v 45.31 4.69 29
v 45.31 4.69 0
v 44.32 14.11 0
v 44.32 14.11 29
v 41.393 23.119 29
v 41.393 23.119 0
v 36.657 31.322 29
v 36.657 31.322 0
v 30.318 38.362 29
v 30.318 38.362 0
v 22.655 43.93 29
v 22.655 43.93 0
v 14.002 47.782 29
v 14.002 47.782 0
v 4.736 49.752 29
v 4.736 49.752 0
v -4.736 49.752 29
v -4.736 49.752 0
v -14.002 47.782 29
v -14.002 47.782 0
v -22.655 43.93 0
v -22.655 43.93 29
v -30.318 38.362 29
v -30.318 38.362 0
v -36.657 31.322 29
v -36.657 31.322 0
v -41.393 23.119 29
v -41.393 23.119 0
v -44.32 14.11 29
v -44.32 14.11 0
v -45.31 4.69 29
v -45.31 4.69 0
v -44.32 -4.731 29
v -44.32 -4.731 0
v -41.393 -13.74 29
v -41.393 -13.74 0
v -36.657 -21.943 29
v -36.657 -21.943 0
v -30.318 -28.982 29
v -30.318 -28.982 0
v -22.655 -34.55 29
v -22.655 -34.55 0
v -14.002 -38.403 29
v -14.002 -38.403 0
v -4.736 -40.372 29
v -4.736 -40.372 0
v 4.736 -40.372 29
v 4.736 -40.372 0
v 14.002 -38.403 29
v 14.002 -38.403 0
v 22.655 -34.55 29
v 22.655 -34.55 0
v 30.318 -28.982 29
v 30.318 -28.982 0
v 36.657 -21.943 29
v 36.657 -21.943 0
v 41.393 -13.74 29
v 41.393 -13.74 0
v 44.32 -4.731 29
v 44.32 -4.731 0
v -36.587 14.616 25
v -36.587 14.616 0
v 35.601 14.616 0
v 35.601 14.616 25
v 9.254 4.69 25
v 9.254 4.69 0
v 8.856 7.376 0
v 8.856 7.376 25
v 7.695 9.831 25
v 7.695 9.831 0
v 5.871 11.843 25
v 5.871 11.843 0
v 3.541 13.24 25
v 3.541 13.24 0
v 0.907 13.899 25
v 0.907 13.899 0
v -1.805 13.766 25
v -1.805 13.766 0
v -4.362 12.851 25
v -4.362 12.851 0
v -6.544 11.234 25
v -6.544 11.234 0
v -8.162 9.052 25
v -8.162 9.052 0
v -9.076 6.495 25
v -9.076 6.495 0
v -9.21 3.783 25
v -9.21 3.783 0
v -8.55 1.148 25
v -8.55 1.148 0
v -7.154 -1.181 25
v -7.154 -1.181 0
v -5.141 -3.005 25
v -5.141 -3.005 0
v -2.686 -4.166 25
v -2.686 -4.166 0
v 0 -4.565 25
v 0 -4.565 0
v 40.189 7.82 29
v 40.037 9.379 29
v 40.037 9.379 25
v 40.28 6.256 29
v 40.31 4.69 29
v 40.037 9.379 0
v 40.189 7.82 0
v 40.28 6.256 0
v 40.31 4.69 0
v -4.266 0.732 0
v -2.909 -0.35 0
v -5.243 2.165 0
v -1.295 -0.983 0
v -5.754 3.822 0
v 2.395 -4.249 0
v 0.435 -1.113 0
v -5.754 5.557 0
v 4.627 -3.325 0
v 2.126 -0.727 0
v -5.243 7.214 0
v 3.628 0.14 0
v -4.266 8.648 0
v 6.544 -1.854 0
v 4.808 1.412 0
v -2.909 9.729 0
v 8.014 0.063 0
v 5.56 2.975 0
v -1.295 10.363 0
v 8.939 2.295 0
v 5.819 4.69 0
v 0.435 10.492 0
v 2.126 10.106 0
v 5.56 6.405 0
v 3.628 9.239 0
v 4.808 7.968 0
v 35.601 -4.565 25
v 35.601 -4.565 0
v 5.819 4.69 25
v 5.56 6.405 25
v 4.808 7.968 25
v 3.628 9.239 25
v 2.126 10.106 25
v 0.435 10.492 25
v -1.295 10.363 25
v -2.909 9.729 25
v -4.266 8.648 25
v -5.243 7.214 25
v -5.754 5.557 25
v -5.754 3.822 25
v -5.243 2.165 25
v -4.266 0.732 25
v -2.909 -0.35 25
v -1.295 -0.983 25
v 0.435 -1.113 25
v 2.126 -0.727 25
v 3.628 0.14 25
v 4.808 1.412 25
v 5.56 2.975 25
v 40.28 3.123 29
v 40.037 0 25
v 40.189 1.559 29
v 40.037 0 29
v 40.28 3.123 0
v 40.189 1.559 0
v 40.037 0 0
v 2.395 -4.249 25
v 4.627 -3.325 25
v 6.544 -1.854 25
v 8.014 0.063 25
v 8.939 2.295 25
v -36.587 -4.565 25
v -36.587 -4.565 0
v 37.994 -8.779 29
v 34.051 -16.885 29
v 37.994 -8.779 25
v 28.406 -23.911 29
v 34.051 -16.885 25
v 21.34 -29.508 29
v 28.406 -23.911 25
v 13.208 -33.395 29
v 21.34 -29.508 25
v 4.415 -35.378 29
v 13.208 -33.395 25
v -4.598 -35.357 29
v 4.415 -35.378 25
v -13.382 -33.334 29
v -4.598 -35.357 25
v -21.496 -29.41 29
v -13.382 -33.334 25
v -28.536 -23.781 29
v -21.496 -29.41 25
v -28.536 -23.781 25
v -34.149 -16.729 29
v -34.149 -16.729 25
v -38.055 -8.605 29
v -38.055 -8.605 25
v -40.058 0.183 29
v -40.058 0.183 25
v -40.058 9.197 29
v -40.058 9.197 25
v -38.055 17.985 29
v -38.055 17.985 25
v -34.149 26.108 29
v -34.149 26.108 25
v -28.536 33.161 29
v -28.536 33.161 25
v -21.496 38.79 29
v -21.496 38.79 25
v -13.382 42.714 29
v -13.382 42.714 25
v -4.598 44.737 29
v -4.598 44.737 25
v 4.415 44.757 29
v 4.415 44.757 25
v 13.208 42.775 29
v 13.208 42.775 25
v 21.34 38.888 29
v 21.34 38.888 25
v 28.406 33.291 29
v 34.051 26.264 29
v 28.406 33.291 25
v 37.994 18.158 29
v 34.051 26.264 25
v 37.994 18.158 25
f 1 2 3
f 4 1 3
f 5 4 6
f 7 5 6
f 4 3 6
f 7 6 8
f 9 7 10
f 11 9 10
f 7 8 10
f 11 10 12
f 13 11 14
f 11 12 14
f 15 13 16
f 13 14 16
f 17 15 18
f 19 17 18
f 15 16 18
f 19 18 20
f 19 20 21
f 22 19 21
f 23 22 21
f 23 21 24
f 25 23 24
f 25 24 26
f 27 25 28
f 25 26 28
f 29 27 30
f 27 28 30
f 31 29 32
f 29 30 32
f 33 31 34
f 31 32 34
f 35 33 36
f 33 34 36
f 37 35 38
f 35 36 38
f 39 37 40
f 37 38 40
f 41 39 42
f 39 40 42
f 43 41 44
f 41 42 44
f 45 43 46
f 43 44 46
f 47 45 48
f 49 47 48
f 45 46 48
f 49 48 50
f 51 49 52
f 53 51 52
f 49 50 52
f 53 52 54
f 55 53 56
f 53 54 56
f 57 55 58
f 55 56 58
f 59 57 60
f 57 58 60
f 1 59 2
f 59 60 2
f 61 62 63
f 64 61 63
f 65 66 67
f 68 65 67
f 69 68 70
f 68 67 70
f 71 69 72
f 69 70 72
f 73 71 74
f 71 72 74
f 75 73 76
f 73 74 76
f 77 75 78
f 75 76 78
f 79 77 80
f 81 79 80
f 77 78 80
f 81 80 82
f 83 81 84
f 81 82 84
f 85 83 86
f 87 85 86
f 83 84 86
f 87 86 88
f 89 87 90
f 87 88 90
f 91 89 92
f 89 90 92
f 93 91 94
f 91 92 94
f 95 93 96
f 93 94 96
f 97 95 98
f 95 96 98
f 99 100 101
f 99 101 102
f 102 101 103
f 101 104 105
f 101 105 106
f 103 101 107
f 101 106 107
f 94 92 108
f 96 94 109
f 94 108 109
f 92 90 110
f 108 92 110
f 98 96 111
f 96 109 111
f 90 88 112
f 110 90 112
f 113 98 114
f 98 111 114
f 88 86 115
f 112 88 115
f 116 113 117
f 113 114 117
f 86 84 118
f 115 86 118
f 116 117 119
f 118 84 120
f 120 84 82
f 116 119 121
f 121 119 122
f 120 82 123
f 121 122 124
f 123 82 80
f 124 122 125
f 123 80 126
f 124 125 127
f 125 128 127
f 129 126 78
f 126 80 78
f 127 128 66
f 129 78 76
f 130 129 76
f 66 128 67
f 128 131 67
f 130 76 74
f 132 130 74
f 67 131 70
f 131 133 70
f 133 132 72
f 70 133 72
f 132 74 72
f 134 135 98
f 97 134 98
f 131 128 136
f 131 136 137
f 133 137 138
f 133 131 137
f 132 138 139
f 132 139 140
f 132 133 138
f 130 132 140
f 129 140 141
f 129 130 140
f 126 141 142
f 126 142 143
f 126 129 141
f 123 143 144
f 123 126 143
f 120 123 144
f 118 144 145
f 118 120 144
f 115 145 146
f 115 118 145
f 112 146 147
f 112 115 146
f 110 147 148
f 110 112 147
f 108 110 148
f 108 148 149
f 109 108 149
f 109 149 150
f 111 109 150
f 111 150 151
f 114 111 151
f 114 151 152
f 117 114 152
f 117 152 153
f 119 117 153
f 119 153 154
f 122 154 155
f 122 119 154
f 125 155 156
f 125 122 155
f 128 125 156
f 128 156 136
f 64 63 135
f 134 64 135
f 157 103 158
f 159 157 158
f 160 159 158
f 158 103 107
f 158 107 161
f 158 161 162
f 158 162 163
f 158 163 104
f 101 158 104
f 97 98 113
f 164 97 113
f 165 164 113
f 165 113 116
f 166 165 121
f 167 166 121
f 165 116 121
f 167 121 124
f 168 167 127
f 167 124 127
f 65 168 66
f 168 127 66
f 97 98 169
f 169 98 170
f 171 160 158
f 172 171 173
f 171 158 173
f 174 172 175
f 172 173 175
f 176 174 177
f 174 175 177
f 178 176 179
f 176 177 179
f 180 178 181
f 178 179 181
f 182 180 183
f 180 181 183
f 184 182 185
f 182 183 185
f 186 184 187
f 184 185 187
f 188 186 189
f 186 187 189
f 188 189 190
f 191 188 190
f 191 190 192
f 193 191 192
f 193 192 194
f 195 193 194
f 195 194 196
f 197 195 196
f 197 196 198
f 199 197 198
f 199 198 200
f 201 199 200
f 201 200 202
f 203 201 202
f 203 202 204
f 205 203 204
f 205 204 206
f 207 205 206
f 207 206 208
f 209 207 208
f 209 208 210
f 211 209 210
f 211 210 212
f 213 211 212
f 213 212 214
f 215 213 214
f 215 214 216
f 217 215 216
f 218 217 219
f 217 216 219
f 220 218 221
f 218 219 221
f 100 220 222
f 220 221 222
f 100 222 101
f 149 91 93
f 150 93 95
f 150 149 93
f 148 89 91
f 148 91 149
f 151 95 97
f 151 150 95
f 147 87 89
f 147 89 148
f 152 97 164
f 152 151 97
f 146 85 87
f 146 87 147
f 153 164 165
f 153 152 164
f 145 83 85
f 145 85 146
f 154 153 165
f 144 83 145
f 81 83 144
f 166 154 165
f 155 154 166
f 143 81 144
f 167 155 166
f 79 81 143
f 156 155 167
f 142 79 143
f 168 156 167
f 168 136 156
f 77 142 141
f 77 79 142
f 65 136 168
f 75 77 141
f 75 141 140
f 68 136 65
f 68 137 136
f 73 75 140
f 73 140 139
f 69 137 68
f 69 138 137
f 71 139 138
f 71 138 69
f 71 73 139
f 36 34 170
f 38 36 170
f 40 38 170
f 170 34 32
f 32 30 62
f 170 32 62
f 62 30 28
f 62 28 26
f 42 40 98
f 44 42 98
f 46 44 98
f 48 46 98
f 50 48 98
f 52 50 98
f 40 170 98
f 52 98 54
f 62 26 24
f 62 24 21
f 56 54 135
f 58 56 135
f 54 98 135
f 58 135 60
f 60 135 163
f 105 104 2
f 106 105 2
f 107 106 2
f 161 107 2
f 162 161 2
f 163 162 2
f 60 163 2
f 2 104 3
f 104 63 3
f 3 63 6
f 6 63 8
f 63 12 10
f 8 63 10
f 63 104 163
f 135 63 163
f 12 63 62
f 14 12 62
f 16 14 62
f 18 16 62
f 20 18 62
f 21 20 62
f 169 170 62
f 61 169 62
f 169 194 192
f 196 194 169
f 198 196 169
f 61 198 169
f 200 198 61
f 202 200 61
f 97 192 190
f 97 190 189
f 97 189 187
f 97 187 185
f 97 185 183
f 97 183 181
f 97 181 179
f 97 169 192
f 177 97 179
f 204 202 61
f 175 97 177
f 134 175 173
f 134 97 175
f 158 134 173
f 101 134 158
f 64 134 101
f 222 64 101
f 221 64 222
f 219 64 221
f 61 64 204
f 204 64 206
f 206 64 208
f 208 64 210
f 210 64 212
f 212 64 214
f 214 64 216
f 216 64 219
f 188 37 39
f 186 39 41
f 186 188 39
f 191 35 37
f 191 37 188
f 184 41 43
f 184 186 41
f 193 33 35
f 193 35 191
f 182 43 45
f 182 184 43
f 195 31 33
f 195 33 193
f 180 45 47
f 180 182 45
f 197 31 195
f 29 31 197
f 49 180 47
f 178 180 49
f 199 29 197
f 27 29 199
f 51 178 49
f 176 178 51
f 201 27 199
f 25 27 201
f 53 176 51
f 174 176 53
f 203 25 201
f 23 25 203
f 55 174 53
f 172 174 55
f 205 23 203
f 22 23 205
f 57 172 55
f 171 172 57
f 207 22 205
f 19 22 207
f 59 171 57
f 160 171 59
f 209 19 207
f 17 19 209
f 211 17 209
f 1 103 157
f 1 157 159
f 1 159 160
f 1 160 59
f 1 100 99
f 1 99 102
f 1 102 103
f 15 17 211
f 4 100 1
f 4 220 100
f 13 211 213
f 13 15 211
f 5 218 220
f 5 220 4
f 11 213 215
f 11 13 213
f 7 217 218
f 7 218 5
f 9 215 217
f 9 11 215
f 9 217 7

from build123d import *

# Parameters (mm, degrees)
F0_R     = 45.3102610886
F1_DEPTH = 29
F2_DEPTH = 30
F0_R_2   = 5.8189451516
F3_DEPTH = 25


with BuildPart() as f1:
    # F0 (on Top) → F1 (new body)
    with BuildSketch(Plane.XY):
        with Locations((0, 4.6897389114)):
            Circle(F0_R)
        with BuildLine():
            ThreePointArc((40.0365270468, 0), (-5.2843801511, -35.2726493486), (-39.8794180788, 10.567592493))
            ThreePointArc((-39.8794180788, 10.567592493), (0.5992286077, 44.9955458641), (40.0365270468, 9.3794778229))
            ThreePointArc((40.0365270468, 9.3794778229), (40.2417693905, 7.038599347), (40.3102610886, 4.6897389114))
            ThreePointArc((40.3102610886, 4.6897389114), (40.2417693905, 2.3408784759), (40.0365270468, 0))
        make_face(mode=Mode.SUBTRACT)
    extrude(amount=F1_DEPTH)

    # F0 (on Top) → F2 (cut)
    with BuildSketch(Plane.XY):
        with Locations((0, 4.6897389114)):
            Circle(F0_R)
        with BuildLine():
            ThreePointArc((40.0365270468, 0), (-5.2843801511, -35.2726493486), (-39.8794180788, 10.567592493))
            ThreePointArc((-39.8794180788, 10.567592493), (0.5992286077, 44.9955458641), (40.0365270468, 9.3794778229))
            ThreePointArc((40.0365270468, 9.3794778229), (40.2417693905, 7.038599347), (40.3102610886, 4.6897389114))
            ThreePointArc((40.3102610886, 4.6897389114), (40.2417693905, 2.3408784759), (40.0365270468, 0))
        make_face(mode=Mode.SUBTRACT)
    extrude(amount=-F2_DEPTH, mode=Mode.SUBTRACT)



with BuildPart() as f3:
    # F0 (on Top) → F3 (new body)
    with BuildSketch(Plane.XY):
        with BuildLine():
            ThreePointArc((0, -4.5645707527), (6.5437851187, -1.8540462073), (9.2543096641, 4.6897389114))
            ThreePointArc((9.2543096641, 4.6897389114), (-6.5437851187, 11.2335240302), (0, -4.5645707527))
        make_face()
        with Locations((0, 4.6897389114)):
            Circle(F0_R_2, mode=Mode.SUBTRACT)
    extrude(amount=F3_DEPTH)


with BuildPart() as f1_1:
    add(f1.part)

    add(f3.part)  # F3#2 merges F3
    # F0 (on Top) → F3, piece 2 (join)
    with BuildSketch(Plane.XY):
        with BuildLine():
            ThreePointArc((40.0365270468, 9.3794778229), (0.5992286077, 44.9955458641), (-39.8794180788, 10.567592493))
            ThreePointArc((-39.8794180788, 10.567592493), (-5.2843801511, -35.2726493486), (40.0365270468, 0))
            Line((40.0365270468, 0), (40.0365270468, 9.3794778229))
        make_face()
        Polygon((35.6006100774, -4.5645707527), (0, -4.5645707527), (-36.5868918598, -4.5645707527), (-36.5868918598, 14.6164782345), (35.6006100774, 14.6164782345), align=None, mode=Mode.SUBTRACT)
    extrude(amount=F3_DEPTH)


solid = f1_1.part
